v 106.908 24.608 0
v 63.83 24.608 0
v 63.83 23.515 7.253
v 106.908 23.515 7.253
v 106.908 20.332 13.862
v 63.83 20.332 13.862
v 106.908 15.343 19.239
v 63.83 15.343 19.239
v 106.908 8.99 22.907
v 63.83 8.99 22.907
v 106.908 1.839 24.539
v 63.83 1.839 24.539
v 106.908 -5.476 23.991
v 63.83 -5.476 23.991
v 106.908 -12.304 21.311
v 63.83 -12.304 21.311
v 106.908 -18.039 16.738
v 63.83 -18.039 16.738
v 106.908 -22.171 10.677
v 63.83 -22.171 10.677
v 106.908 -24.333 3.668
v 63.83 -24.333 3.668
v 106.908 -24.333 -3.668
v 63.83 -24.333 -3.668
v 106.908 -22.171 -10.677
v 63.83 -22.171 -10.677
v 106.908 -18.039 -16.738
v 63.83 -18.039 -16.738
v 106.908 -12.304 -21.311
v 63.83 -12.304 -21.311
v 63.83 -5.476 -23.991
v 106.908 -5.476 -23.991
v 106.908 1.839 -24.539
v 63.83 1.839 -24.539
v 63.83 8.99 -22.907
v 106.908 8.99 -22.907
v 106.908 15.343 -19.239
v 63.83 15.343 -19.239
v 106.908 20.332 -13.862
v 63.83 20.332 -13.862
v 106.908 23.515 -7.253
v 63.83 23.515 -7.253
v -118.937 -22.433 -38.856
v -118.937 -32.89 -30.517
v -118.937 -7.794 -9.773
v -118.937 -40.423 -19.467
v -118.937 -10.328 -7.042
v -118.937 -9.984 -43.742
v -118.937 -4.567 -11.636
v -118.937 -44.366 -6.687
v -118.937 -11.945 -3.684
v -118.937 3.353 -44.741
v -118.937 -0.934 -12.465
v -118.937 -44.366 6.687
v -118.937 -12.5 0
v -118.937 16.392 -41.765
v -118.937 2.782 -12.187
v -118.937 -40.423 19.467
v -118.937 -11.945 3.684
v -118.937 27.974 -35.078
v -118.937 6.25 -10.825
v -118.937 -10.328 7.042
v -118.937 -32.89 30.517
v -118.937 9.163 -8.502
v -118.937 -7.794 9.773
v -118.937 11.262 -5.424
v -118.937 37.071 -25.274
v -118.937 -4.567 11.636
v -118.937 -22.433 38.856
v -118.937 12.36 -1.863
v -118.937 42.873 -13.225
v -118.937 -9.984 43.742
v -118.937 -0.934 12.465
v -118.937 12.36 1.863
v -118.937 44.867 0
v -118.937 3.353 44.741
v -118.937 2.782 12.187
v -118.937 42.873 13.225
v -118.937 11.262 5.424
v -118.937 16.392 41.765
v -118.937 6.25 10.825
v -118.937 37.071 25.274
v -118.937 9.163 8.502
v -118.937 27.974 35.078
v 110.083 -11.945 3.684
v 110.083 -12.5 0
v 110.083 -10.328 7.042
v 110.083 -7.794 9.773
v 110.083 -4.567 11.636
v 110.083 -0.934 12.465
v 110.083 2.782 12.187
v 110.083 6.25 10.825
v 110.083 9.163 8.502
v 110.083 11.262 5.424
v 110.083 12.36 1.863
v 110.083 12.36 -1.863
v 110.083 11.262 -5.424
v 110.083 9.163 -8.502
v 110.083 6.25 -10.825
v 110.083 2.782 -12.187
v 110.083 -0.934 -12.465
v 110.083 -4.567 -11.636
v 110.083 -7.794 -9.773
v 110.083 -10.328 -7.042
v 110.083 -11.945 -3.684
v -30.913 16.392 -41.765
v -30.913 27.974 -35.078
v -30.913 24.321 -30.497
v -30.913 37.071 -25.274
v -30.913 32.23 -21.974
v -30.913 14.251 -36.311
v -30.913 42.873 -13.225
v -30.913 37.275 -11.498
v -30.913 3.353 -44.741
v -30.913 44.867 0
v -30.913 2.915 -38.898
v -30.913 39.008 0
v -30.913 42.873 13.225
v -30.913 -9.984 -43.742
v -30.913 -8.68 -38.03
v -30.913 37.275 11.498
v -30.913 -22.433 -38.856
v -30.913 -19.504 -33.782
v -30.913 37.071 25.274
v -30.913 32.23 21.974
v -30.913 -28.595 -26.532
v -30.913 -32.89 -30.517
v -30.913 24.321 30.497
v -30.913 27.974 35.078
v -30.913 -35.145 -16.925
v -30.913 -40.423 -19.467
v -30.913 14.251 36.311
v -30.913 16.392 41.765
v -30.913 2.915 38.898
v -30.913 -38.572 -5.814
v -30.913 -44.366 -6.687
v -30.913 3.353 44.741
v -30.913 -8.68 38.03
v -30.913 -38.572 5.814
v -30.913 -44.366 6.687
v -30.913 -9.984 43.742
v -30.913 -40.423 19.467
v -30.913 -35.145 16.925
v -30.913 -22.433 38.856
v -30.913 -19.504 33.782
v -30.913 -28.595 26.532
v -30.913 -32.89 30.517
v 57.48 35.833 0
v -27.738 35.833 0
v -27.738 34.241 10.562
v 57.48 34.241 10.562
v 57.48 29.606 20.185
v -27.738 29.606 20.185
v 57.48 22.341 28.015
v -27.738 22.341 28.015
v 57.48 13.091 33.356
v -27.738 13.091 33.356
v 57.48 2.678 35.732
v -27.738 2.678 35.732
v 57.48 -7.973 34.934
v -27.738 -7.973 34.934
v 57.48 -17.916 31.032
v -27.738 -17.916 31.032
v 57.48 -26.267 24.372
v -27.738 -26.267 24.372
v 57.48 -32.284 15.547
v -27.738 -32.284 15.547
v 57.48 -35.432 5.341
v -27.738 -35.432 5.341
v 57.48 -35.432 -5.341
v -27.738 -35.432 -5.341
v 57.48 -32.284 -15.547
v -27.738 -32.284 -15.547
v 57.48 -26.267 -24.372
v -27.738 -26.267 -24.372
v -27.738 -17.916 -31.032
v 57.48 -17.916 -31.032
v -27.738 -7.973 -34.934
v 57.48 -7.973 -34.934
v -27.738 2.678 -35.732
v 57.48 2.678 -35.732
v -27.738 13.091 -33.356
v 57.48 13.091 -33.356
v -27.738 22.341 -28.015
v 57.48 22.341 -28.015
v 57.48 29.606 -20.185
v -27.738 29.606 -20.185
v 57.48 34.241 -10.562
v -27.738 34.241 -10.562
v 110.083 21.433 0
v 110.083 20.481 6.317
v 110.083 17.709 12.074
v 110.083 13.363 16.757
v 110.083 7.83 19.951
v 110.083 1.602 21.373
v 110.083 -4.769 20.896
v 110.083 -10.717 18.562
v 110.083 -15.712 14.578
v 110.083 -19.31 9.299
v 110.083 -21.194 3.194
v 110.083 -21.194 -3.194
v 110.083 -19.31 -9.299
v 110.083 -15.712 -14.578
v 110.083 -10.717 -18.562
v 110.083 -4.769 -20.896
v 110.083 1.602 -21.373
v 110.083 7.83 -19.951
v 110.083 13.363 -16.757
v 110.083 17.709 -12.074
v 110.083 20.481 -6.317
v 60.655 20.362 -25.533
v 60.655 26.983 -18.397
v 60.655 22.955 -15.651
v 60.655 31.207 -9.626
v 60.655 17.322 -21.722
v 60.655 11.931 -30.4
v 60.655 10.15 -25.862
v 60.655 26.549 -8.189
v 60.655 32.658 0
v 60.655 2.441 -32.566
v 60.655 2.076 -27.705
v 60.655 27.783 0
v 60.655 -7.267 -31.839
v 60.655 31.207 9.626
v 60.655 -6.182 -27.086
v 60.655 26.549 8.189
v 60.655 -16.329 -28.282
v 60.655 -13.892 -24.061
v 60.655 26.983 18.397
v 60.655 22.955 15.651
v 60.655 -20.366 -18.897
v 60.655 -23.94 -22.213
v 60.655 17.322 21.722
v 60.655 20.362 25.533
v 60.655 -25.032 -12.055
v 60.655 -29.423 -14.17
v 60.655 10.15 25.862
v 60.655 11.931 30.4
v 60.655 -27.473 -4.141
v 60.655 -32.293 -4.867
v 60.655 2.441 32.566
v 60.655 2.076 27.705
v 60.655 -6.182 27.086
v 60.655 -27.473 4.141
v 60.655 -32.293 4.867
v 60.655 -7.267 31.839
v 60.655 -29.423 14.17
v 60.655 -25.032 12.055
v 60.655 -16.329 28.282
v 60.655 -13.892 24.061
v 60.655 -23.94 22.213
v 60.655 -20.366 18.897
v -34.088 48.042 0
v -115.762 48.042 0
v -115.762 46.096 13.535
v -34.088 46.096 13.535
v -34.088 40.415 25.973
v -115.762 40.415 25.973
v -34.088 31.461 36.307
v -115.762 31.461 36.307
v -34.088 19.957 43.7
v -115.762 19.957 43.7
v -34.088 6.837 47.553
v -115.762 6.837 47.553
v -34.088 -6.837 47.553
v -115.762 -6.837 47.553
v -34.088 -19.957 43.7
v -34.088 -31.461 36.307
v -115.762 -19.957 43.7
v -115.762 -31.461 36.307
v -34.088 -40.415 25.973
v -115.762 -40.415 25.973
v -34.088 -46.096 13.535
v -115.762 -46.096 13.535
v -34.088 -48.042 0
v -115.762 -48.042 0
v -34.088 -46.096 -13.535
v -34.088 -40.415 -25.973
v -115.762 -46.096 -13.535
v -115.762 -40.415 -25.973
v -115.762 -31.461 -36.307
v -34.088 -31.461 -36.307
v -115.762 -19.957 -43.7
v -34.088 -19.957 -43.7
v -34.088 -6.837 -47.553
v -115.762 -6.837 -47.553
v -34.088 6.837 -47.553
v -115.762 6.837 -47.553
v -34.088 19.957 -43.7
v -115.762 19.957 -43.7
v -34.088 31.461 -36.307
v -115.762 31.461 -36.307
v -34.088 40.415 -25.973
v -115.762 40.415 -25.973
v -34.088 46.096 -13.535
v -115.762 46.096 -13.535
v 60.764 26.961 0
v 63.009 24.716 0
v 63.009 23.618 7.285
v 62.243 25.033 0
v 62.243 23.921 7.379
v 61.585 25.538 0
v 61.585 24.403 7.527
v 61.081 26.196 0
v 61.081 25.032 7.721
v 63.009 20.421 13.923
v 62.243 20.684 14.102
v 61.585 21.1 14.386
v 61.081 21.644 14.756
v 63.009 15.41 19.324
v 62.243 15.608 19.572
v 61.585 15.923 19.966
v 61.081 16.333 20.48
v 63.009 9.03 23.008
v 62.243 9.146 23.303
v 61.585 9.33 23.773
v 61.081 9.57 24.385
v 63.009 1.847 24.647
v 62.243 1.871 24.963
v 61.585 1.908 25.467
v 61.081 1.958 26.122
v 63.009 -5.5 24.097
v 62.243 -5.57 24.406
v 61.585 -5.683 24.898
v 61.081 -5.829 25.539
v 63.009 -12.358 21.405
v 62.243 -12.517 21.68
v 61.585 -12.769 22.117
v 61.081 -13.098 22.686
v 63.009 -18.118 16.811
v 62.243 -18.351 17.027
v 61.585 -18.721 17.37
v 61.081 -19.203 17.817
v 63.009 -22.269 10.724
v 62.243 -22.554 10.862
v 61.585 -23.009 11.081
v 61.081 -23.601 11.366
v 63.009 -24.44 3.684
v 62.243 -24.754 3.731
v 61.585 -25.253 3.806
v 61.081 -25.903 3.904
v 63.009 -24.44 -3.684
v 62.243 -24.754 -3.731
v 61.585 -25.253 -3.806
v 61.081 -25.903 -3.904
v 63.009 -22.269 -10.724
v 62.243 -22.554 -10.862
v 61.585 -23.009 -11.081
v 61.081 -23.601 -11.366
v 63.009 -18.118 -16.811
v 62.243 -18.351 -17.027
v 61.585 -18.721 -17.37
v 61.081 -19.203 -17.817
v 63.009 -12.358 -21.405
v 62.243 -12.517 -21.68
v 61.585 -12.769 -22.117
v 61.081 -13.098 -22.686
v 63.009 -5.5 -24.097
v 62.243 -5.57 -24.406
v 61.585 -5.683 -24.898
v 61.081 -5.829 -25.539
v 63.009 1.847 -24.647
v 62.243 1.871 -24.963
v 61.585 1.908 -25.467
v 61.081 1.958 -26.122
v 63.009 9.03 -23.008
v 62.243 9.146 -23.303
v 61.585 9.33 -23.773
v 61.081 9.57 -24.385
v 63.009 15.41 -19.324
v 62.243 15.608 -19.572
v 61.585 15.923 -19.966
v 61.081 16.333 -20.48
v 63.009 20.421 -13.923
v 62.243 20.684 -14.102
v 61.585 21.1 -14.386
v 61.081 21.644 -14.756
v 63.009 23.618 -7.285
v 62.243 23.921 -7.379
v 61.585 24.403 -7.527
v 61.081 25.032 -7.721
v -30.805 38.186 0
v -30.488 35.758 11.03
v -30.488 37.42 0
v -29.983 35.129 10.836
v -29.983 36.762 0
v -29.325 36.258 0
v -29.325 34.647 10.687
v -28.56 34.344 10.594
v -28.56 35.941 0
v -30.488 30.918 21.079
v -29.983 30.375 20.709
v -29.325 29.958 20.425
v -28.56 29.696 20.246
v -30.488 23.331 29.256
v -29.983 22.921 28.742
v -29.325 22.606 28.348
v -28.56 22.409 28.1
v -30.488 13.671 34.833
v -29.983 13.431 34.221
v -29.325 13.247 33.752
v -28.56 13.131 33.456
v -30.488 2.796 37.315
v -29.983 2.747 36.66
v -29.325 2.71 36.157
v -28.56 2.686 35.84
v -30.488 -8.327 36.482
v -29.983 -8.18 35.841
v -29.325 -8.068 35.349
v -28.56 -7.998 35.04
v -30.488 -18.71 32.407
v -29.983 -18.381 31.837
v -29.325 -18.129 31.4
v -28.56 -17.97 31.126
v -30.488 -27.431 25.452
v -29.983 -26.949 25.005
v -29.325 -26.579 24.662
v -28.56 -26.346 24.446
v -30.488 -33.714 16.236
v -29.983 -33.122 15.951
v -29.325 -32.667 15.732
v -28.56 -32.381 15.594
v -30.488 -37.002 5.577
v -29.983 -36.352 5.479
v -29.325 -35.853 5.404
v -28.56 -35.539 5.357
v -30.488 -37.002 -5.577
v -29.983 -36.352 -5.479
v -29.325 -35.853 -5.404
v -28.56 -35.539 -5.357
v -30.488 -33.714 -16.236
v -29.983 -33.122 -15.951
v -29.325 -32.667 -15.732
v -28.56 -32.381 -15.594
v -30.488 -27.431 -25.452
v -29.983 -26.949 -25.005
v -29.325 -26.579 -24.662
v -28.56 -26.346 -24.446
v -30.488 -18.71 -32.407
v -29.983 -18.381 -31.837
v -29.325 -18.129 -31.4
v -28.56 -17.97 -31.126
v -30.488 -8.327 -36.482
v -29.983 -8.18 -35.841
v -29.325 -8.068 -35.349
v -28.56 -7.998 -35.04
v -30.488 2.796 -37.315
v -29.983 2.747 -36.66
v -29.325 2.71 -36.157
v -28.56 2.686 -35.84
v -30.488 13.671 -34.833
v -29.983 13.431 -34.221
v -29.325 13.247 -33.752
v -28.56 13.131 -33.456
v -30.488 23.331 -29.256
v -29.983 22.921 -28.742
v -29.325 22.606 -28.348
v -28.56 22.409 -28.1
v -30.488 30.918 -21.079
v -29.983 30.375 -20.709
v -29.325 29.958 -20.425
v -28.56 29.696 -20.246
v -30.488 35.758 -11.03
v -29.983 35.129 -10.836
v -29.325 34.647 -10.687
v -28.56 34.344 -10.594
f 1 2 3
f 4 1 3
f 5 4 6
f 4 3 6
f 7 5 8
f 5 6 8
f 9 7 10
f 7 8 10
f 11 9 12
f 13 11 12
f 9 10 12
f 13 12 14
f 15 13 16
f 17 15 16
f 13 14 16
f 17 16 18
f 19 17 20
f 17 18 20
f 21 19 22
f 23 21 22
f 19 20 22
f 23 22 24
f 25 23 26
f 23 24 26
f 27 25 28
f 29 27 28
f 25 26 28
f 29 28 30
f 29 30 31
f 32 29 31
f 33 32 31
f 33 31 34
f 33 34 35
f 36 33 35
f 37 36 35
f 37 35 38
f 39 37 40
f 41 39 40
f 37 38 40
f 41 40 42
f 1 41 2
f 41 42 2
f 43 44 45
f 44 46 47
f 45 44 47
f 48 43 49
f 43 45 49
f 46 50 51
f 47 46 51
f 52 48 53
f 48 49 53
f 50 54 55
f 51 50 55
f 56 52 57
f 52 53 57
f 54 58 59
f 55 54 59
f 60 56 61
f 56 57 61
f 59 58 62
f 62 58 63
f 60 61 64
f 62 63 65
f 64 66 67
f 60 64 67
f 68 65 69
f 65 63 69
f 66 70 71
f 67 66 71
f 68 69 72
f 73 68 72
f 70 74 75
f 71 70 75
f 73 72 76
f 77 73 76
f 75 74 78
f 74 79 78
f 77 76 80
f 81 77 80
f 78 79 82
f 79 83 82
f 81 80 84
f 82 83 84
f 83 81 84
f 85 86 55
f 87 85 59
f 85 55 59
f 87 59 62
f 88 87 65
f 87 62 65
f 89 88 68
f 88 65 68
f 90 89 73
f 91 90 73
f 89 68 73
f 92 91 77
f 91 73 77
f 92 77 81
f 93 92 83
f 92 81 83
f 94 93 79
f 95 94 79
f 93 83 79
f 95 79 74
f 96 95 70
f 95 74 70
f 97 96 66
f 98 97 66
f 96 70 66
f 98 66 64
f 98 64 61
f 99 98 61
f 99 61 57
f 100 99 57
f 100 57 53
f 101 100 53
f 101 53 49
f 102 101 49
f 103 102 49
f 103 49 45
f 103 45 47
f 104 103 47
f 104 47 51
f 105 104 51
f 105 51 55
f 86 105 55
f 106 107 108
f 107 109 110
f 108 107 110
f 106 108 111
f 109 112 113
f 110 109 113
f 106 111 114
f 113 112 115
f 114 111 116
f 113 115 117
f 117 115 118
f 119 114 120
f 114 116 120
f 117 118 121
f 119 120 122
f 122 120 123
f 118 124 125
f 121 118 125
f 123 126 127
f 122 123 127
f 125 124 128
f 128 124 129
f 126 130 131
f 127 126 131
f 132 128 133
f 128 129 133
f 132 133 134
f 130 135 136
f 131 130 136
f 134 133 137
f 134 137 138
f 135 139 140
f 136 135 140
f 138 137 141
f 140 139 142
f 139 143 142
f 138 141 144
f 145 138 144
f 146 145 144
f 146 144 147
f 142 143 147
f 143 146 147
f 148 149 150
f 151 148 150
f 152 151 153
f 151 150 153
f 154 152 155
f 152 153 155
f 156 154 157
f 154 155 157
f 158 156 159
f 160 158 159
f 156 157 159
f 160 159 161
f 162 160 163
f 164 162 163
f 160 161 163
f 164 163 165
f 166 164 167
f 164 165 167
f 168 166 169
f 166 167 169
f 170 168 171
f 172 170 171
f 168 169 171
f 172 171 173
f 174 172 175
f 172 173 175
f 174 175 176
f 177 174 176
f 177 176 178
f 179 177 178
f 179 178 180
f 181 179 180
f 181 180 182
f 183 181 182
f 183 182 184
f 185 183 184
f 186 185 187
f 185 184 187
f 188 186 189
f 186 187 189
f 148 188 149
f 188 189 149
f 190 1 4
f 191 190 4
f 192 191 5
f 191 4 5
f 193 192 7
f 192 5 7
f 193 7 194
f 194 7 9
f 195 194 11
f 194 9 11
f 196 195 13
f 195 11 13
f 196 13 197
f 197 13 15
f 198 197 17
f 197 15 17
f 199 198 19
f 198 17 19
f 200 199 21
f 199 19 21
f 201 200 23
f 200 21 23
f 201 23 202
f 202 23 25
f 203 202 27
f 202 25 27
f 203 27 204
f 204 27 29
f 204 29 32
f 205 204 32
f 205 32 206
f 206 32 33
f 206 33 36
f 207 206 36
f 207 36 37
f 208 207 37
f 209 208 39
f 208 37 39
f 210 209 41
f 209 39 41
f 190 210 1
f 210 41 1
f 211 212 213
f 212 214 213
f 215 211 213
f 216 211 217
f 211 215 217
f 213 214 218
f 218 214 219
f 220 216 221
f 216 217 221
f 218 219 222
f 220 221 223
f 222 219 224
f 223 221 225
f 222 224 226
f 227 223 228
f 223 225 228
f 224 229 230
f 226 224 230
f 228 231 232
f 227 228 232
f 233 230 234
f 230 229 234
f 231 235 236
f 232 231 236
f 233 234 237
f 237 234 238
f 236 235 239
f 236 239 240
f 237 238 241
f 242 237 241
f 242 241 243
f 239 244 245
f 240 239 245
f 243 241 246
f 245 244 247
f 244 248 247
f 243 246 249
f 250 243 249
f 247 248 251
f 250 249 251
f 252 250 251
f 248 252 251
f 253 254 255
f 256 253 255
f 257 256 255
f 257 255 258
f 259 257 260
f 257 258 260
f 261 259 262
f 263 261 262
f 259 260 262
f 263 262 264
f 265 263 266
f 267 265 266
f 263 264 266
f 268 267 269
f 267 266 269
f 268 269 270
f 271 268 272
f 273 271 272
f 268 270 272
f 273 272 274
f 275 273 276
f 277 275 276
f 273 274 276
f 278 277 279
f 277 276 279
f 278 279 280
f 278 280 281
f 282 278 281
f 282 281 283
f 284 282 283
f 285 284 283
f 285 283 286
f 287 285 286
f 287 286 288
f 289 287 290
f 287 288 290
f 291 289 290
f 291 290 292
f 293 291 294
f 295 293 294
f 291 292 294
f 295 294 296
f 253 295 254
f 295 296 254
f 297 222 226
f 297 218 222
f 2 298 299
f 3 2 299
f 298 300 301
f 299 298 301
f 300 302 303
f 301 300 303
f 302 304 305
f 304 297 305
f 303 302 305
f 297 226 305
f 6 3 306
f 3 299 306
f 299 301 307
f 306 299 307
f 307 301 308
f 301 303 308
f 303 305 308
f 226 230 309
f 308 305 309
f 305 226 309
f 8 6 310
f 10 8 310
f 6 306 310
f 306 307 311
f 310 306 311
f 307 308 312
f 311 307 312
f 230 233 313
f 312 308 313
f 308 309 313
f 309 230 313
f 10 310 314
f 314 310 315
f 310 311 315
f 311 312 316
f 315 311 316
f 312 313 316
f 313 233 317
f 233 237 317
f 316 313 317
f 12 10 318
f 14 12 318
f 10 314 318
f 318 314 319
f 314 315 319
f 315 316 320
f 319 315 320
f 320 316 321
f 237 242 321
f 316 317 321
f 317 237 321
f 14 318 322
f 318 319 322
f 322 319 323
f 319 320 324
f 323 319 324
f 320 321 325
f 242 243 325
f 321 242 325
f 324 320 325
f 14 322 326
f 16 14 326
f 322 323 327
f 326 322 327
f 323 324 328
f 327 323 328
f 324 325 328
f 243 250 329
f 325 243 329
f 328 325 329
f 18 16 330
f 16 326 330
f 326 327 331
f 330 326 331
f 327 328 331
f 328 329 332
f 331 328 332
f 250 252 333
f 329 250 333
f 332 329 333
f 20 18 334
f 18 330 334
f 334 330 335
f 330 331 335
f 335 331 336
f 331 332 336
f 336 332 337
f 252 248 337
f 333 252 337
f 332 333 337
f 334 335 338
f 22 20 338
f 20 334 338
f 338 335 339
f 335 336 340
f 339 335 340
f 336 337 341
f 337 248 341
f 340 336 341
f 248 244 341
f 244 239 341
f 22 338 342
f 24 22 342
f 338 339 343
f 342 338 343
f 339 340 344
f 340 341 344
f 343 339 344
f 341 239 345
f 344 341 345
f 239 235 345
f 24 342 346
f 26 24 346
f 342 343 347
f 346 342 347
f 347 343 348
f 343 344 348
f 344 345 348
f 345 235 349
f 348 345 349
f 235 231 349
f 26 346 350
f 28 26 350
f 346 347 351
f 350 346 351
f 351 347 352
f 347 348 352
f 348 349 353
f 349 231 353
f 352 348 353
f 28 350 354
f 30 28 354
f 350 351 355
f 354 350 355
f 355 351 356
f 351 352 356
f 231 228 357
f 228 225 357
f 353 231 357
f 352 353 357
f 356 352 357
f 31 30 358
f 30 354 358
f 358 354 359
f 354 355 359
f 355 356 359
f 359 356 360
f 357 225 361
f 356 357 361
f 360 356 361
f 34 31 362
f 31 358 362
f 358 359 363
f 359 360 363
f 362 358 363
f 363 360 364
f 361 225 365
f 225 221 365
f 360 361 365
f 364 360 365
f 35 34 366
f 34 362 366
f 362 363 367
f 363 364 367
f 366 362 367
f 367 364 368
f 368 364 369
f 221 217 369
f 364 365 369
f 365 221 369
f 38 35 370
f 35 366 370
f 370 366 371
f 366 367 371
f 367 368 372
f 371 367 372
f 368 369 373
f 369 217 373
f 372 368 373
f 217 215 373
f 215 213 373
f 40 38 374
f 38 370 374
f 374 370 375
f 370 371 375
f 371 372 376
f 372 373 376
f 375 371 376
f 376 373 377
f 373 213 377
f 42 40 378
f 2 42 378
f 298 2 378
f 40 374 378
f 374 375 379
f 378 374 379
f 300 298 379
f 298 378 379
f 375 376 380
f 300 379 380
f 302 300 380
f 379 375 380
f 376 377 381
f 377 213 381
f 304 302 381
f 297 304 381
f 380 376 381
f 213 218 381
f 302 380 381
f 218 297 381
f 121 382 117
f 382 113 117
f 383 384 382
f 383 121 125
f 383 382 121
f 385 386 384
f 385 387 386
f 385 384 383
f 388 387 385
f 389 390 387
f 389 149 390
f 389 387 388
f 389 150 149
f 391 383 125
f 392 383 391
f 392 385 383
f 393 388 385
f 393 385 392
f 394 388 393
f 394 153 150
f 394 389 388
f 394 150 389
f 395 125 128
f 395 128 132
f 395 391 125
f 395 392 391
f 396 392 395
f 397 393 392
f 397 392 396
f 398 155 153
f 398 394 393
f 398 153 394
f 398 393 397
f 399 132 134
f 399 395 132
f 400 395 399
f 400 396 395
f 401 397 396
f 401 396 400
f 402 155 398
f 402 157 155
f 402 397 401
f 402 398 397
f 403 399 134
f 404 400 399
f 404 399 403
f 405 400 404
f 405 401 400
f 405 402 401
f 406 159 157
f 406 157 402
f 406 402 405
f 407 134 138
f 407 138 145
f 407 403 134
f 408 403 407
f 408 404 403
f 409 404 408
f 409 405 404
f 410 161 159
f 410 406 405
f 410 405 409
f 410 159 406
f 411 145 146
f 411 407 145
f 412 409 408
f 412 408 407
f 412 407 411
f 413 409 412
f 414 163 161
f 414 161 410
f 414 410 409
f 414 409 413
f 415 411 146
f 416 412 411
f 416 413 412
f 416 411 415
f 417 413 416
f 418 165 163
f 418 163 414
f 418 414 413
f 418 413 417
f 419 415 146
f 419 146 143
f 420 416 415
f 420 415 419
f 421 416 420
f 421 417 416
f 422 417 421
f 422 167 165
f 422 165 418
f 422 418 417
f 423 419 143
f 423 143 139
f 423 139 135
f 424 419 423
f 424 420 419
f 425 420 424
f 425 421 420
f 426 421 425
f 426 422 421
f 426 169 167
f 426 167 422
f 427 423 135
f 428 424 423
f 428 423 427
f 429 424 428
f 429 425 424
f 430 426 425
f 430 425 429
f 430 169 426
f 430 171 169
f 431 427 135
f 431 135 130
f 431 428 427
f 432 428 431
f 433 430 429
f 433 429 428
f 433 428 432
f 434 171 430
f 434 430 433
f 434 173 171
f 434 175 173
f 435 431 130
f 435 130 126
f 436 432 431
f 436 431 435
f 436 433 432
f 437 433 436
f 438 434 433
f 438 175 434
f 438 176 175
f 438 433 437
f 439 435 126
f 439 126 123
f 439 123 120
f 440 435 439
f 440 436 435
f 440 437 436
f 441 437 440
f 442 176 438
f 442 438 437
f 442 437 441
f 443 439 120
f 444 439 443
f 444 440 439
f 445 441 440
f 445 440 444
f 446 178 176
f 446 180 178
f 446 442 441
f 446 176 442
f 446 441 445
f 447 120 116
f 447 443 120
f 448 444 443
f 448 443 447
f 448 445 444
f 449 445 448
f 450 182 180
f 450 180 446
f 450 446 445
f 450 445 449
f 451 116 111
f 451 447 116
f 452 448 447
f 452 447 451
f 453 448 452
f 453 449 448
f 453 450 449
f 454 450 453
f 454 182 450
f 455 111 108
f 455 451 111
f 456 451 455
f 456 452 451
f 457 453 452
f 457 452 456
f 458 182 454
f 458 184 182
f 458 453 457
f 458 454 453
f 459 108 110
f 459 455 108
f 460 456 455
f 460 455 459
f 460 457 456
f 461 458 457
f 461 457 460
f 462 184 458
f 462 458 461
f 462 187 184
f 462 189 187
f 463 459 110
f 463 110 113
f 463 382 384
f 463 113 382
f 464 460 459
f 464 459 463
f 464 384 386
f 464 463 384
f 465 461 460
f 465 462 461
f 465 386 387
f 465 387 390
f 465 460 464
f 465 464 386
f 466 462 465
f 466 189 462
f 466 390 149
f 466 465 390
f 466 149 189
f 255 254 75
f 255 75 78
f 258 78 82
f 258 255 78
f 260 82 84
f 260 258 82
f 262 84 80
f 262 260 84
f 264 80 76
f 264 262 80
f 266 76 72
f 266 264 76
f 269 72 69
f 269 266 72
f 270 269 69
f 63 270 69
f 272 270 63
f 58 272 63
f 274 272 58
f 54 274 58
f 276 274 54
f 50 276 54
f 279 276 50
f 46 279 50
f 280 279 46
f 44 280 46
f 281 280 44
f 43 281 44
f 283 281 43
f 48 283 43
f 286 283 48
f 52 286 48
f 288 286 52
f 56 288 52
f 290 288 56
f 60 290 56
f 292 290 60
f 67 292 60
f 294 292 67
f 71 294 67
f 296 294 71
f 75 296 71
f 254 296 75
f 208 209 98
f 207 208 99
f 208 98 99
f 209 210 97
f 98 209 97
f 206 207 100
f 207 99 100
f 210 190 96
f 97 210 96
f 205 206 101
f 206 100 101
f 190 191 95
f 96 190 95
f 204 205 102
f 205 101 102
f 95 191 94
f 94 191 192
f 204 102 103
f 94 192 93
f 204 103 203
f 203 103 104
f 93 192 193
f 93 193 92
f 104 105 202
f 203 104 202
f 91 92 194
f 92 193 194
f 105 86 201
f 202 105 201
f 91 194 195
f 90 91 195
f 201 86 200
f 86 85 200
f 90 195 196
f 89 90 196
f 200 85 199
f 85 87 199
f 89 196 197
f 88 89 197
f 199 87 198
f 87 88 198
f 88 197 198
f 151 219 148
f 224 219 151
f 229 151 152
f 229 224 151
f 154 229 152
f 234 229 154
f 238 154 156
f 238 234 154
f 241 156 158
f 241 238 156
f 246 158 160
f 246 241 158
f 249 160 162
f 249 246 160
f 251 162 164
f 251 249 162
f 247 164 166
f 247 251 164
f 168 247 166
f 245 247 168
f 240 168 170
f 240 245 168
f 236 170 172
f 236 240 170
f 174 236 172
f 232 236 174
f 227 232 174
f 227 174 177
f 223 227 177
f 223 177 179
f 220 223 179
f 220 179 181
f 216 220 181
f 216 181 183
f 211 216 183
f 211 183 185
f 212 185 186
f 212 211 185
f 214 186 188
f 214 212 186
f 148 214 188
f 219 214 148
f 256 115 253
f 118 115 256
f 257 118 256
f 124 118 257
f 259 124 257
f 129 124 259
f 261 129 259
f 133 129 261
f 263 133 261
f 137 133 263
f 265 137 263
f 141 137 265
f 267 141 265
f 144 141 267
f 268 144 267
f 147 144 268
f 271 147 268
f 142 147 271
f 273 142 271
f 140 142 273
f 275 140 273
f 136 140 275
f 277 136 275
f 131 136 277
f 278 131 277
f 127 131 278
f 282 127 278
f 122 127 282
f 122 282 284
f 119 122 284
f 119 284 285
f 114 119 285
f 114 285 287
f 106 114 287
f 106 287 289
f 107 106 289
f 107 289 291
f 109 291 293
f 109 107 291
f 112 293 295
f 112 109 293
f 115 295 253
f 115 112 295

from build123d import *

# Parameters (mm, degrees)
F2_R     = 12.5
F3_DEPTH = 253.15408
F4_SIZE  = 3.175
F5_R     = 3.175


with BuildPart() as f1:
    # F0 (on Top) → F1 (revolve)
    with BuildSketch(Plane.XY):
        Polygon((-118.936889, 48.041679), (-118.936889, 0), (110.082783, 0), (110.082783, 24.608025), (60.65549, 24.608025), (60.65549, 35.83255), (-30.912993, 35.83255), (-30.912993, 48.041679), align=None)
    revolve(axis=Axis((-4.427053, 0, 0), (1, 0, 0)))

    # F2 (on face) → F3 (cut)
    with BuildSketch(Plane(origin=(-118.936889, 0, 0), x_dir=(0, -1, 0), z_dir=(-1, 0, 0))):
        Circle(F2_R)
    extrude(amount=-F3_DEPTH, mode=Mode.SUBTRACT)

    # F4
    f4_edges = [f1.edges().sort_by_distance(p)[0] for p in [
        (-118.936889, -48.041679, 0),
        (-30.912993, -48.041679, 0),
        (60.65549, -35.83255, 0),
        (110.082783, -24.608025, 0),
    ]]
    chamfer(f4_edges, length=F4_SIZE)

    # F5
    f5_edges = [f1.edges().sort_by_distance(p)[0] for p in [
        (60.65549, -24.608025, 0),
        (-30.912993, -35.83255, 0),
    ]]
    fillet(f5_edges, radius=F5_R)


solid = f1.part
